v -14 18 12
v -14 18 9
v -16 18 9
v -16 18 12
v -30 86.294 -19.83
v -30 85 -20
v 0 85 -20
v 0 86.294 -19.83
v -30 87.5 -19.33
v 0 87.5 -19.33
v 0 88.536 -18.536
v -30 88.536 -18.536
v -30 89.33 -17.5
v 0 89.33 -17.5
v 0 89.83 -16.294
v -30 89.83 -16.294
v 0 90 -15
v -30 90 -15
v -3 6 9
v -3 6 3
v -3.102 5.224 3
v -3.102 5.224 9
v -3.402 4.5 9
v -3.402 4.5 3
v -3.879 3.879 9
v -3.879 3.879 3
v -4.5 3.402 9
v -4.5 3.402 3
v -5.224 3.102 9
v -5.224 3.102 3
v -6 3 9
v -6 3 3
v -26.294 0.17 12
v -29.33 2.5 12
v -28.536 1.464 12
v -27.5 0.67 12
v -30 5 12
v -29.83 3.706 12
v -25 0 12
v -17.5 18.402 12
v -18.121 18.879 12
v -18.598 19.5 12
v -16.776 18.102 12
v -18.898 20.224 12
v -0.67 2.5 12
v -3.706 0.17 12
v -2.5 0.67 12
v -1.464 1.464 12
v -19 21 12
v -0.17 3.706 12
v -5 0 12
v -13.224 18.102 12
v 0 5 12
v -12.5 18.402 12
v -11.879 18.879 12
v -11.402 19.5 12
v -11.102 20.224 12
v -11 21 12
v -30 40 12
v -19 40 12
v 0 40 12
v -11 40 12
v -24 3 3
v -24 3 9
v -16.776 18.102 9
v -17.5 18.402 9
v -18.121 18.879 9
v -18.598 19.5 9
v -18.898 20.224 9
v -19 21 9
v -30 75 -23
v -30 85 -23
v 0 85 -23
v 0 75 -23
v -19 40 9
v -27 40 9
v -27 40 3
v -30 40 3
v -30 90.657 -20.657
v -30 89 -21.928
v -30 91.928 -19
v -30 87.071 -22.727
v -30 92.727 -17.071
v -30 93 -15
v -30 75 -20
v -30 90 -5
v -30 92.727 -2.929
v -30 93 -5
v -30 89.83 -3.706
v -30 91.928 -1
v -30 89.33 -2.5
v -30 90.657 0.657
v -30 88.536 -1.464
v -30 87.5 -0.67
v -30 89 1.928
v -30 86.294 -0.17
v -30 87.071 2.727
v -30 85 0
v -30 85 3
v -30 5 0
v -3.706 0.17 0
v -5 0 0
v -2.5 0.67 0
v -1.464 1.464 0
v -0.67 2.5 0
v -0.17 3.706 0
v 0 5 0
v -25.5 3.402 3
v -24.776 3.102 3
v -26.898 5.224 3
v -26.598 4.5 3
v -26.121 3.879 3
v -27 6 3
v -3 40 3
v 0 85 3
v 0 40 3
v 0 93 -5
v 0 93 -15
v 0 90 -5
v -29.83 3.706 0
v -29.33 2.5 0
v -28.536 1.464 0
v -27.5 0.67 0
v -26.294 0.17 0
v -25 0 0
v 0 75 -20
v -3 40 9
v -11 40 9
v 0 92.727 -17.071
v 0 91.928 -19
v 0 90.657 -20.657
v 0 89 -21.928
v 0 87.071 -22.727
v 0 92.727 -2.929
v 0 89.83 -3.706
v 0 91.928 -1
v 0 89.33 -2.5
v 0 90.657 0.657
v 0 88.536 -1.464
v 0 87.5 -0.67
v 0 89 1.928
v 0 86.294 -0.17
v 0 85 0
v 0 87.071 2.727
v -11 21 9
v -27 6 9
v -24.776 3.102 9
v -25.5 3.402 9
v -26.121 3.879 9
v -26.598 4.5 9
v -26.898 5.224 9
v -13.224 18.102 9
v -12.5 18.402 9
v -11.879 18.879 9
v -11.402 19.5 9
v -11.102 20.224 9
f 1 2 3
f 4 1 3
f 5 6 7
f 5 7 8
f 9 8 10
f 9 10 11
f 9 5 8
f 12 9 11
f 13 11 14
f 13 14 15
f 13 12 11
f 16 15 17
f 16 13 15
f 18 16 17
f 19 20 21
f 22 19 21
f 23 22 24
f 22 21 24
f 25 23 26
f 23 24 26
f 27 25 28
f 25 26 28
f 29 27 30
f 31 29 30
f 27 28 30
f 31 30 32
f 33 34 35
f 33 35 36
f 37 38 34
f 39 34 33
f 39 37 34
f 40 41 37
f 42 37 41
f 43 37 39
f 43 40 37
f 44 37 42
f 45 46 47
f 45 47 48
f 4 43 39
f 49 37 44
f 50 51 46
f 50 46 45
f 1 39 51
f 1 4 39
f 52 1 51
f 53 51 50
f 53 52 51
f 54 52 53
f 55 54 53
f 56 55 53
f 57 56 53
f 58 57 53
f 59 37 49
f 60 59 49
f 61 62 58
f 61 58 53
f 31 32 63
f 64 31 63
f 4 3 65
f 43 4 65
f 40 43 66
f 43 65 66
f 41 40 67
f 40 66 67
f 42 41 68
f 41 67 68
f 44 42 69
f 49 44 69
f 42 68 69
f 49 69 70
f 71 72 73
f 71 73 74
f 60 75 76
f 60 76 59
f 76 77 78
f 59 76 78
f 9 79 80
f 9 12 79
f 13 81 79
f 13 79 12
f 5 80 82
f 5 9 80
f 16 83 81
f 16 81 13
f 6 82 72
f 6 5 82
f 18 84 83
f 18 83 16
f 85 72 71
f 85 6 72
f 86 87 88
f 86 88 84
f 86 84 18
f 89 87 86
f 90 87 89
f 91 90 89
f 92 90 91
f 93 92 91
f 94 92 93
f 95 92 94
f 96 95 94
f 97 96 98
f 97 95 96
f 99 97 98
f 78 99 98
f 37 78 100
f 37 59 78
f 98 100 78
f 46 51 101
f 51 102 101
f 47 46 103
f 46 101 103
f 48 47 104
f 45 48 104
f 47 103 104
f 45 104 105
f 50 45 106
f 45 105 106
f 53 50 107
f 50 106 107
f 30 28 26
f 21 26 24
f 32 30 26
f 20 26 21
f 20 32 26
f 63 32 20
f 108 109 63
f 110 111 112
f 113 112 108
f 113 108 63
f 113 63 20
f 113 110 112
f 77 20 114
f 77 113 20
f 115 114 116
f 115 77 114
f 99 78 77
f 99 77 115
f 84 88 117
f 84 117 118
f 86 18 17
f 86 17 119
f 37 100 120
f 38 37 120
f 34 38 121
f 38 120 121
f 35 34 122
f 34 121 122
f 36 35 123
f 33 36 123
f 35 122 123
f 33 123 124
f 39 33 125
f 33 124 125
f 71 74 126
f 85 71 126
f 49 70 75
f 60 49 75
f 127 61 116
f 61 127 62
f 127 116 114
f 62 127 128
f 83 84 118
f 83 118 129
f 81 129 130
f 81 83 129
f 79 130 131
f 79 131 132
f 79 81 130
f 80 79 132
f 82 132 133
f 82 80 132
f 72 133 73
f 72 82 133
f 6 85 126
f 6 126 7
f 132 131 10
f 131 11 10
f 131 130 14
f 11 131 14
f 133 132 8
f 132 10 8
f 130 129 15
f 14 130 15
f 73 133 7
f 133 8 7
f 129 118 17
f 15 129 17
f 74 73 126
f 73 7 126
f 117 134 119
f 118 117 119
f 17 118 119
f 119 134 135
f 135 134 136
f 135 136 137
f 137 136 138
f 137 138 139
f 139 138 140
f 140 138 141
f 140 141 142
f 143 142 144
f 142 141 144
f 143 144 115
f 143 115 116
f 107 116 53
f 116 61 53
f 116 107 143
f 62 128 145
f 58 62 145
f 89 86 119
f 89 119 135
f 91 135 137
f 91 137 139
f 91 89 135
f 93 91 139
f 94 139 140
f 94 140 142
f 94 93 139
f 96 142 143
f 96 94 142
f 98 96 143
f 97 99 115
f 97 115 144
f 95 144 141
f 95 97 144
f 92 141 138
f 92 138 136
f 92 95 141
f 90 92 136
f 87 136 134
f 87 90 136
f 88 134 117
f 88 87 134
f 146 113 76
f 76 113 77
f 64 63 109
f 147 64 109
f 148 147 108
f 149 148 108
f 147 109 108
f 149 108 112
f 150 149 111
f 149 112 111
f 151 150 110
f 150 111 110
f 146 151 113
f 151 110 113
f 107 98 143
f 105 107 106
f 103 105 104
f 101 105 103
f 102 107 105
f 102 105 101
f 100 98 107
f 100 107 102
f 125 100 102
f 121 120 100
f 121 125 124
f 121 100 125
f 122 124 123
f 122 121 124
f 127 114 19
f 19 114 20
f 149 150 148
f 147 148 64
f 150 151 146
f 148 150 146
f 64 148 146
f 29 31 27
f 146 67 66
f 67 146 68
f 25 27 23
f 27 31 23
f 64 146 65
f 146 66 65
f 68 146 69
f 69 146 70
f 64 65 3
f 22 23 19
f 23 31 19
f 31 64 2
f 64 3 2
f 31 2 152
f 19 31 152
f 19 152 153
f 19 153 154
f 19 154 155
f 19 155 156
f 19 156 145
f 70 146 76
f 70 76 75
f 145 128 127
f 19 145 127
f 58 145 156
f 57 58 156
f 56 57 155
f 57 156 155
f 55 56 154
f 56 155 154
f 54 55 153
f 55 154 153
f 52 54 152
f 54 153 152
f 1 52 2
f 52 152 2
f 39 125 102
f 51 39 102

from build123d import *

# Parameters (mm, degrees)
F1_DEPTH = 3
F3_DEPTH = 6
F5_DEPTH = 3
F7_DEPTH = 40
F9_DEPTH = 30


with BuildPart() as f1:
    # F0 (on Top) → F1 (new body)
    with BuildSketch(Plane.XY):
        with BuildLine():
            Line((-25, 0), (-5, 0))
            ThreePointArc((-5, 0), (-1.464466, 1.464466), (0, 5))
            Line((0, 5), (0, 40))
            Line((0, 40), (-30, 40))
            Line((-30, 40), (-30, 5))
            ThreePointArc((-30, 5), (-28.535534, 1.464466), (-25, 0))
        make_face()
    extrude(amount=F1_DEPTH)

    # F2 (on face) → F3 (join)
    with BuildSketch(Plane.XY.offset(3)):
        with BuildLine():
            ThreePointArc((-24, 3), (-26.12132, 3.87868), (-27, 6))
            Line((-27, 6), (-27, 40))
            Line((-27, 40), (-30, 40))
            Line((-30, 40), (-30, 5))
            ThreePointArc((-30, 5), (-28.535534, 1.464466), (-25, 0))
            Line((-25, 0), (-5, 0))
            ThreePointArc((-5, 0), (-1.464466, 1.464466), (0, 5))
            Line((0, 5), (0, 40))
            Line((0, 40), (-3, 40))
            Line((-3, 40), (-3, 6))
            ThreePointArc((-3, 6), (-3.87868, 3.87868), (-6, 3))
            Line((-6, 3), (-24, 3))
        make_face()
    extrude(amount=F3_DEPTH)

    # F4 (on face) → F5 (join)
    with BuildSketch(Plane.XY.offset(9)):
        with BuildLine():
            Line((-25, 0), (-5, 0))
            ThreePointArc((-5, 0), (-1.464466, 1.464466), (0, 5))
            Line((0, 5), (0, 40))
            Line((0, 40), (-11, 40))
            Line((-11, 40), (-11, 21))
            ThreePointArc((-11, 21), (-11.87868, 18.87868), (-14, 18))
            Line((-14, 18), (-16, 18))
            ThreePointArc((-16, 18), (-18.12132, 18.87868), (-19, 21))
            Line((-19, 21), (-19, 40))
            Line((-19, 40), (-30, 40))
            Line((-30, 40), (-30, 5))
            ThreePointArc((-30, 5), (-28.535534, 1.464466), (-25, 0))
        make_face()
    extrude(amount=F5_DEPTH)

    # F6 (on face) → F7 (join)
    with BuildSketch(Plane(origin=(0, 40, 0), x_dir=(-1, 0, 0), z_dir=(0, 1, 0))):
        Polygon((0, 0), (30, 0), (30, 3), (27, 3), (3, 3), (0, 3), align=None)
    extrude(amount=F7_DEPTH)

    # F8 (on face) → F9 (join)
    with BuildSketch(Plane(origin=(-30, 0, 0), x_dir=(0, -1, 0), z_dir=(-1, 0, 0))):
        with BuildLine():
            Line((-85, 0), (-80, 0))
            Line((-80, 0), (-80, 3))
            Line((-80, 3), (-85, 3))
            ThreePointArc((-85, 3), (-90.656854, 0.656854), (-93, -5))
            Line((-93, -5), (-93, -10))
            Line((-93, -10), (-93, -15))
            ThreePointArc((-93, -15), (-90.656854, -20.656854), (-85, -23))
            Line((-85, -23), (-80, -23))
            Line((-80, -23), (-75, -23))
            Line((-75, -23), (-75, -20))
            Line((-75, -20), (-80, -20))
            Line((-80, -20), (-85, -20))
            ThreePointArc((-85, -20), (-88.535534, -18.535534), (-90, -15))
            Line((-90, -15), (-90, -10))
            Line((-90, -10), (-90, -5))
            ThreePointArc((-90, -5), (-88.535534, -1.464466), (-85, 0))
        make_face()
    extrude(amount=-F9_DEPTH)


solid = f1.part
